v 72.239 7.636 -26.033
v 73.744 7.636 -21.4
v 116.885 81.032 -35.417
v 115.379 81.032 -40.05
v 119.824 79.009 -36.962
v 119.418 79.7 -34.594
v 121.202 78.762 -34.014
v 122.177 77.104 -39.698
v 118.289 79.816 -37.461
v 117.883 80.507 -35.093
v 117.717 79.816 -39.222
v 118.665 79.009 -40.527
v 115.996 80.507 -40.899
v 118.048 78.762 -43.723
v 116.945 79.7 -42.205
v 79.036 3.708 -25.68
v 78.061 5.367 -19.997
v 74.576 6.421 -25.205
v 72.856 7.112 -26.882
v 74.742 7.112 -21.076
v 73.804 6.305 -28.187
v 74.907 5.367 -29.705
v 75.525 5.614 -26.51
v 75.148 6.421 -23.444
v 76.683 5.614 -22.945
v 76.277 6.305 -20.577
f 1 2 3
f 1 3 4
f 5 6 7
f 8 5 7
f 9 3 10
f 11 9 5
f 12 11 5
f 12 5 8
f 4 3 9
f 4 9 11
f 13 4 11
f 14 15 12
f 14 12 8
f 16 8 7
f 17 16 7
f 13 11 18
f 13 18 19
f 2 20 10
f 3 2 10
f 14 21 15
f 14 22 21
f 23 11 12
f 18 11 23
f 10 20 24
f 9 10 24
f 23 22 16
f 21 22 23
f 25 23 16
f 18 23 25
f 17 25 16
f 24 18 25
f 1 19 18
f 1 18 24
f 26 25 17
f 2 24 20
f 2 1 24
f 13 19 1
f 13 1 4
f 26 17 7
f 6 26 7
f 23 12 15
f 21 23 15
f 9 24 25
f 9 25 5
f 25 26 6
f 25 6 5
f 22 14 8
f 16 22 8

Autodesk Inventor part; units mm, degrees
sketch "Boceto1" plane through (0, 0, 0) normal (0, 1, 0) x (-1, 0, 0)
  line L0 (47.5, 65.3781) -> (76.8566, -24.9722)
  line L1 (76.8566, -24.9722) -> (0, -80.8118)
  line L2 (0, -80.8118) -> (-76.8566, -24.9722)
  line L3 (-76.8566, -24.9722) -> (-47.5, 65.3781)
  line L4 (-47.5, 65.3781) -> (47.5, 65.3781)
  line L5 (0, 0) -> (130.7563, 0) construction
  line L6 (130.7563, 0) -> (130.7563, 130.7563) construction
  line L7 (130.7563, 130.7563) -> (0, 130.7563) construction
  line L8 (0, 130.7563) -> (0, 0) construction
  line L9 (130.7563, 130.7563) -> (0, 65.3781)
  dimension "d0" = 95
  dimension "d1" = 211.5681
  dimension "d2" = 26.565
extrude "Extrusión1" add sketch "Boceto1" along normal blind 211.5681 draft 26.565
sketch "Boceto2" plane through (0, 211.5681, 0) normal (0, 1, 0) x (1, 0, 0)
  line L0 (0, -80.8118) -> (-76.8566, -24.9722)
  line L1 (-76.8566, -24.9722) -> (-47.5, 65.3781)
  line L2 (-47.5, 65.3781) -> (47.5, 65.3781)
  line L3 (47.5, 65.3781) -> (76.8566, -24.9722)
  line L4 (76.8566, -24.9722) -> (0, -80.8118)
  point P0 (0, 0)
  point P1 (0, 0)
  dimension "L" = 95
extrude "Extrusión2" cut sketch "Boceto2" against normal blind 211.5681 draft 26.565 keep common part
sketch "Boceto3" plane through (47.5, 0, 65.3781) normal (0.8506508, -0.4472136, 0.2763932) x (0.309017, 0, -0.9510565)
  line L0 (47.5, 146.19) -> (124.3566, 90.3504) projected
  line L1 (-29.3566, 90.3504) -> (47.5, 146.19) projected
  line L2 (0, 0) -> (-29.3566, 90.3504) projected
  line L3 (0, 0) -> (95, 0) projected
  line L4 (95, 0) -> (124.3566, 90.3504) projected
  line L5 (117.3032, 88.0586) -> (47.5, 138.7736)
  line L6 (47.5, 138.7736) -> (-22.3032, 88.0586)
  line L7 (-22.3032, 88.0586) -> (4.3593, 6)
  line L8 (4.3593, 6) -> (90.6407, 6)
  line L9 (90.6407, 6) -> (117.3032, 88.0586)
  point P0 (47.5, -29.238)
  dimension "D" = 6
extrude "Extrusión3" cut sketch "Boceto3" against normal blind 111.5681 contours L9 L8 L7 L6 L5
sketch "Boceto4" plane through (76.8566, 0, -24.9722) normal (0.5257311, -0.4472136, -0.7236068) x (-0.809017, 0, -0.5877853)
  line L0 (47.5, 146.19) -> (124.3566, 90.3504) projected
  line L1 (-29.3566, 90.3504) -> (47.5, 146.19) projected
  line L2 (0, 0) -> (-29.3566, 90.3504) projected
  line L3 (0, 0) -> (95, 0) projected
  line L4 (95, 0) -> (124.3566, 90.3504) projected
  line L5 (90.6407, 6) -> (4.3593, 6)
  line L6 (4.3593, 6) -> (-22.3032, 88.0586)
  line L7 (-22.3032, 88.0586) -> (47.5, 138.7736)
  line L8 (47.5, 138.7736) -> (117.3032, 88.0586)
  line L9 (117.3032, 88.0586) -> (90.6407, 6)
  point P0 (47.5, -29.238)
  dimension "d14" = 6
extrude "Extrusión4" cut sketch "Boceto4" against normal blind 111.5681 contours L5 L6 L7 L8 L9
sketch "Boceto5" plane through (0, 0, 0) normal (0, -1, 0) x (1, 0, 0)
  line L0 (76.8566, -24.9722) -> (0, -80.8118) projected
  line L1 (47.5, 65.3781) -> (76.8566, -24.9722) projected
  line L2 (-47.5, 65.3781) -> (47.5, 65.3781) projected
  line L3 (-76.8566, -24.9722) -> (-47.5, 65.3781) projected
  line L4 (0, -80.8118) -> (-76.8566, -24.9722) projected
  line L5 (43.1407, 59.3781) -> (69.8032, -22.6804)
  line L6 (69.8032, -22.6804) -> (0, -73.3954)
  line L7 (0, -73.3954) -> (-69.8032, -22.6804)
  line L8 (-69.8032, -22.6804) -> (-43.1407, 59.3781)
  line L9 (-43.1407, 59.3781) -> (43.1407, 59.3781)
  point P0 (0, 0)
  dimension "d17" = 6
extrude "Extrusión5" cut sketch "Boceto5" against normal blind 111.5681 contours L5 L6 L7 L8 L9
sketch "Boceto6" plane through (47.5, 211.5681, -65.3781) normal (0, 0.4472136, -0.8944272) x (-1, 0, 0)
  line L0 (47.5, -146.19) -> (124.3566, -90.3504) projected
  line L1 (95, 0) -> (124.3566, -90.3504) projected
  line L2 (95, 0) -> (0, 0) projected
  line L3 (0, 0) -> (-29.3566, -90.3504) projected
  line L4 (-29.3566, -90.3504) -> (47.5, -146.19) projected
  line L5 (117.3032, -88.0586) -> (47.5, -138.7736)
  line L6 (47.5, -138.7736) -> (-22.3032, -88.0586)
  line L7 (-22.3032, -88.0586) -> (4.3593, -6)
  line L8 (4.3593, -6) -> (90.6407, -6)
  line L9 (90.6407, -6) -> (117.3032, -88.0586)
  point P0 (47.5, -159.9943)
  dimension "d20" = 6
extrude "Extrusión6" cut sketch "Boceto6" against normal blind 111.5681 contours L5 L6 L7 L8 L9
sketch "Boceto7" plane through (0, 0, -80.8118) normal (-0.5257311, -0.4472136, -0.7236068) x (-0.809017, 0, 0.5877853)
  line L0 (47.5, 146.19) -> (124.3566, 90.3504) projected
  line L1 (-29.3566, 90.3504) -> (47.5, 146.19) projected
  line L2 (0, 0) -> (-29.3566, 90.3504) projected
  line L3 (0, 0) -> (95, 0) projected
  line L4 (95, 0) -> (124.3566, 90.3504) projected
  line L5 (117.3032, 88.0586) -> (47.5, 138.7736)
  line L6 (47.5, 138.7736) -> (-22.3032, 88.0586)
  line L7 (-22.3032, 88.0586) -> (4.3593, 6)
  line L8 (4.3593, 6) -> (90.6407, 6)
  line L9 (90.6407, 6) -> (117.3032, 88.0586)
  point P0 (47.5, -29.238)
  dimension "d23" = 6
extrude "Extrusión7" cut sketch "Boceto7" against normal blind 111.5681 contours L9 L8 L7 L6 L5
sketch "Boceto8" plane through (76.8566, 211.5681, 24.9722) normal (0.8506508, 0.4472136, -0.2763932) x (-0.309017, 0, -0.9510565)
  line L0 (47.5, -146.19) -> (124.3566, -90.3504) projected
  line L1 (95, 0) -> (124.3566, -90.3504) projected
  line L2 (95, 0) -> (0, 0) projected
  line L3 (0, 0) -> (-29.3566, -90.3504) projected
  line L4 (-29.3566, -90.3504) -> (47.5, -146.19) projected
  line L5 (47.5, -138.7736) -> (117.3032, -88.0586)
  line L6 (117.3032, -88.0586) -> (90.6407, -6)
  line L7 (90.6407, -6) -> (4.3593, -6)
  line L8 (4.3593, -6) -> (-22.3032, -88.0586)
  line L9 (-22.3032, -88.0586) -> (47.5, -138.7736)
  point P0 (47.5, -159.9943)
  dimension "d26" = 6
extrude "Extrusión8" cut sketch "Boceto8" against normal blind 111.5681 contours L9 L8 L7 L6 L5
sketch "Boceto9" plane through (0, 211.5681, 0) normal (0, 1, 0) x (1, 0, 0)
  line L0 (78.0615, -19.9972) -> (-16.844, -50.8338) projected
  line L1 (-47.5, 65.3781) -> (47.5, 65.3781) projected
  line L2 (-76.8566, -24.9722) -> (-47.5, 65.3781) projected
  line L3 (0, -80.8118) -> (-76.8566, -24.9722) projected
  line L4 (76.8566, -24.9722) -> (0, -80.8118) projected
  line L5 (47.5, 65.3781) -> (76.8566, -24.9722) projected
  line L6 (0, -73.3954) -> (-69.8032, -22.6804)
  line L7 (-69.8032, -22.6804) -> (-43.1407, 59.3781)
  line L8 (-43.1407, 59.3781) -> (43.1407, 59.3781)
  line L9 (43.1407, 59.3781) -> (69.8032, -22.6804)
  line L10 (69.8032, -22.6804) -> (0, -73.3954)
  point P0 (0, 0)
  dimension "d29" = 6
extrude "Extrusión9" cut sketch "Boceto9" against normal blind 111.5681 contours L6 L7 L8 L9 L10
sketch "Boceto10" plane through (-47.5, 211.5681, -65.3781) normal (-0.8506508, 0.4472136, -0.2763932) x (-0.309017, 0, 0.9510565)
  line L0 (-29.3566, -90.3504) -> (47.5, -146.19) projected
  line L1 (47.5, -146.19) -> (124.3566, -90.3504) projected
  line L2 (95, 0) -> (124.3566, -90.3504) projected
  line L3 (95, 0) -> (0, 0) projected
  line L4 (0, 0) -> (-29.3566, -90.3504) projected
  line L5 (117.3032, -88.0586) -> (47.5, -138.7736)
  line L6 (47.5, -138.7736) -> (-22.3032, -88.0586)
  line L7 (-22.3032, -88.0586) -> (4.3593, -6)
  line L8 (4.3593, -6) -> (90.6407, -6)
  line L9 (90.6407, -6) -> (117.3032, -88.0586)
  point P0 (47.5, -159.9943)
  dimension "d32" = 6
extrude "Extrusión10" cut sketch "Boceto10" against normal blind 111.5681 contours L5 L6 L7 L8 L9
sketch "Boceto11" plane through (-76.8566, 0, -24.9722) normal (-0.8506508, -0.4472136, 0.2763932) x (0.309017, 0, 0.9510565)
  line L0 (47.5, 65.3781) -> (90.6407, 79.3954) projected
  line L1 (-29.3566, 90.3504) -> (47.5, 146.19) projected
  line L2 (0, 0) -> (-29.3566, 90.3504) projected
  line L3 (0, 0) -> (95, 0) projected
  line L4 (95, 0) -> (124.3566, 90.3504) projected
  line L5 (47.5, 146.19) -> (124.3566, 90.3504) projected
  line L6 (117.3032, 88.0586) -> (90.6407, 6)
  line L7 (90.6407, 6) -> (4.3593, 6)
  line L8 (4.3593, 6) -> (-22.3032, 88.0586)
  line L9 (-22.3032, 88.0586) -> (47.5, 138.7736)
  line L10 (47.5, 138.7736) -> (117.3032, 88.0586)
  point P0 (47.5, -29.238)
  dimension "d35" = 6
extrude "Extrusión11" cut sketch "Boceto11" against normal blind 111.5681 contours L6 L7 L8 L9 L10
sketch "Boceto12" plane through (-47.5, 0, 65.3781) normal (0, -0.4472136, 0.8944272) x (1, 0, 0)
  line L0 (4.3593, 6) -> (47.5, 65.3781) projected
  line L1 (-29.3566, 90.3504) -> (47.5, 146.19) projected
  line L2 (0, 0) -> (-29.3566, 90.3504) projected
  line L3 (0, 0) -> (95, 0) projected
  line L4 (95, 0) -> (124.3566, 90.3504) projected
  line L5 (47.5, 146.19) -> (124.3566, 90.3504) projected
  line L6 (117.3032, 88.0586) -> (90.6407, 6)
  line L7 (90.6407, 6) -> (4.3593, 6)
  line L8 (4.3593, 6) -> (-22.3032, 88.0586)
  line L9 (-22.3032, 88.0586) -> (47.5, 138.7736)
  line L10 (47.5, 138.7736) -> (117.3032, 88.0586)
  point P0 (47.5, -29.238)
  dimension "d38" = 6
extrude "Extrusión12" cut sketch "Boceto12" against normal blind 111.5681 contours L6 L7 L8 L9 L10
sketch "Boceto13" plane through (0, 211.5681, 80.8118) normal (0.5257311, 0.4472136, 0.7236068) x (0.809017, 0, -0.5877853)
  line L0 (-29.3566, -90.3504) -> (47.5, -146.19) projected
  line L1 (47.5, -146.19) -> (124.3566, -90.3504) projected
  line L2 (95, 0) -> (124.3566, -90.3504) projected
  line L3 (95, 0) -> (0, 0) projected
  line L4 (0, 0) -> (-29.3566, -90.3504) projected
  line L5 (47.5, -138.7736) -> (-22.3032, -88.0586)
  line L6 (-22.3032, -88.0586) -> (4.3593, -6)
  line L7 (4.3593, -6) -> (90.6407, -6)
  line L8 (90.6407, -6) -> (117.3032, -88.0586)
  line L9 (117.3032, -88.0586) -> (47.5, -138.7736)
  point P0 (47.5, -159.9943)
  dimension "d41" = 6
extrude "Extrusión13" cut sketch "Boceto13" against normal blind 111.5681 contours L5 L6 L7 L8 L9
sketch "Boceto14" plane through (-76.8566, 211.5681, 24.9722) normal (-0.5257311, 0.4472136, 0.7236068) x (0.809017, 0, 0.5877853)
  line L0 (-29.3566, -90.3504) -> (47.5, -146.19) projected
  line L1 (47.5, -146.19) -> (124.3566, -90.3504) projected
  line L2 (95, 0) -> (124.3566, -90.3504) projected
  line L3 (95, 0) -> (0, 0) projected
  line L4 (0, 0) -> (-29.3566, -90.3504) projected
  line L5 (-22.3032, -88.0586) -> (47.5, -138.7736)
  line L6 (47.5, -138.7736) -> (117.3032, -88.0586)
  line L7 (117.3032, -88.0586) -> (90.6407, -6)
  line L8 (90.6407, -6) -> (4.3593, -6)
  line L9 (4.3593, -6) -> (-22.3032, -88.0586)
  point P0 (47.5, -159.9943)
  dimension "d44" = 6
extrude "Extrusión14" cut sketch "Boceto14" against normal blind 111.5681 contours L9 L8 L7 L6 L5
ref_plane "Plano de trabajo1" through (47.5, 210.2265, -62.6949) normal (0, 0.4472136, -0.8944272) x (-1, 0, 0)
sketch "Boceto15" plane through (47.5, 210.2265, -62.6949) normal (0, 0.4472136, -0.8944272) x (-1, 0, 0)
  line L0 (4.3593, -6) -> (90.6407, -6) projected
  line L1 (-22.3032, -88.0586) -> (4.3593, -6) projected
  line L2 (47.5, -138.7736) -> (-22.3032, -88.0586) projected
  line L3 (117.3032, -88.0586) -> (47.5, -138.7736) projected
  line L4 (90.6407, -6) -> (117.3032, -88.0586) projected
  line L5 (2.5429, -3.5) -> (92.4571, -3.5)
  line L6 (92.4571, -3.5) -> (120.2421, -89.0135)
  line L7 (120.2421, -89.0135) -> (47.5, -141.8637)
  line L8 (47.5, -141.8637) -> (-25.2421, -89.0135)
  line L9 (-25.2421, -89.0135) -> (2.5429, -3.5)
  point P0 (47.5, -159.9943)
  dimension "D2" = 2.5
extrude "Extrusión15" cut sketch "Boceto15" along normal mid plane 1.8 contours L0 L4 L3 L2 L1 | L5 L6 L7 L8 L9
ref_plane "Plano de trabajo2" through (75.2794, 1.3416, -22.8014) normal (0.5257311, -0.4472136, -0.7236068) x (-0.809017, 0, -0.5877853)
sketch "Boceto16" plane through (75.2794, 1.3416, -22.8014) normal (0.5257311, -0.4472136, -0.7236068) x (-0.809017, 0, -0.5877853)
  line L0 (90.6407, 6) -> (4.3593, 6) projected
  line L1 (117.3032, 88.0586) -> (90.6407, 6) projected
  line L2 (47.5, 138.7736) -> (117.3032, 88.0586) projected
  line L3 (-22.3032, 88.0586) -> (47.5, 138.7736) projected
  line L4 (4.3593, 6) -> (-22.3032, 88.0586) projected
  line L5 (2.5429, 3.5) -> (92.4571, 3.5)
  line L6 (92.4571, 3.5) -> (120.2421, 89.0135)
  line L7 (120.2421, 89.0135) -> (47.5, 141.8637)
  line L8 (47.5, 141.8637) -> (-25.2421, 89.0135)
  line L9 (-25.2421, 89.0135) -> (2.5429, 3.5)
  point P0 (47.5, -29.238)
  dimension "d52" = 2.5
extrude "Extrusión16" cut sketch "Boceto16" along normal mid plane 1.8
ref_plane "Plano de trabajo3" through (74.3047, 210.2265, 25.8014) normal (0.8506508, 0.4472136, -0.2763932) x (-0.309017, 0, -0.9510565)
sketch "Boceto17" plane through (74.3047, 210.2265, 25.8014) normal (0.8506508, 0.4472136, -0.2763932) x (-0.309017, 0, -0.9510565)
  line L0 (47.5, -138.7736) -> (-22.3032, -88.0586) projected
  line L1 (117.3032, -88.0586) -> (47.5, -138.7736) projected
  line L2 (90.6407, -6) -> (117.3032, -88.0586) projected
  line L3 (4.3593, -6) -> (90.6407, -6) projected
  line L4 (-22.3032, -88.0586) -> (4.3593, -6) projected
  line L5 (-25.2421, -89.0135) -> (47.5, -141.8637)
  line L6 (47.5, -141.8637) -> (120.2421, -89.0135)
  line L7 (120.2421, -89.0135) -> (92.4571, -3.5)
  line L8 (92.4571, -3.5) -> (2.5429, -3.5)
  line L9 (2.5429, -3.5) -> (-25.2421, -89.0135)
  point P0 (47.5, -159.9943)
  dimension "d56" = 2.5
extrude "Extrusión17" cut sketch "Boceto17" along normal mid plane 1.8
ref_plane "Plano de trabajo4" through (1.5772, 1.3416, -78.641) normal (-0.5257311, -0.4472136, -0.7236068) x (-0.809017, 0, 0.5877853)
sketch "Boceto18" plane through (1.5772, 1.3416, -78.641) normal (-0.5257311, -0.4472136, -0.7236068) x (-0.809017, 0, 0.5877853)
  line L0 (117.3032, 88.0586) -> (90.6407, 6) projected
  line L1 (47.5, 138.7736) -> (117.3032, 88.0586) projected
  line L2 (-22.3032, 88.0586) -> (47.5, 138.7736) projected
  line L3 (4.3593, 6) -> (-22.3032, 88.0586) projected
  line L4 (90.6407, 6) -> (4.3593, 6) projected
  line L5 (92.4571, 3.5) -> (120.2421, 89.0135)
  line L6 (120.2421, 89.0135) -> (47.5, 141.8637)
  line L7 (47.5, 141.8637) -> (-25.2421, 89.0135)
  line L8 (-25.2421, 89.0135) -> (2.5429, 3.5)
  line L9 (2.5429, 3.5) -> (92.4571, 3.5)
  point P0 (47.5, -29.238)
  dimension "d60" = 2.5
extrude "Extrusión18" cut sketch "Boceto18" along normal mid plane 1.8 contours L0 L4 L3 L2 L1 | L9 L8 L7 L6 L5
ref_plane "Plano de trabajo5" through (0, 3, 0) normal (0, -1, 0) x (1, 0, 0)
sketch "Boceto19" plane through (0, 3, 0) normal (0, -1, 0) x (1, 0, 0)
  line L0 (0, -73.3954) -> (-69.8032, -22.6804) projected
  line L1 (-69.8032, -22.6804) -> (-43.1407, 59.3781) projected
  line L2 (-43.1407, 59.3781) -> (43.1407, 59.3781) projected
  line L3 (43.1407, 59.3781) -> (69.8032, -22.6804) projected
  line L4 (69.8032, -22.6804) -> (0, -73.3954) projected
  line L5 (76.8566, -24.9722) -> (0, -80.8118) projected
  line L6 (47.5, 65.3781) -> (76.8566, -24.9722) projected
  line L7 (-47.5, 65.3781) -> (47.5, 65.3781) projected
  line L8 (-76.8566, -24.9722) -> (-47.5, 65.3781) projected
  line L9 (0, -80.8118) -> (-76.8566, -24.9722) projected
  line L10 (-44.9571, 61.8781) -> (-72.7421, -23.6353)
  line L11 (-72.7421, -23.6353) -> (0, -76.4856)
  line L12 (0, -76.4856) -> (72.7421, -23.6353)
  line L13 (72.7421, -23.6353) -> (44.9571, 61.8781)
  line L14 (44.9571, 61.8781) -> (-44.9571, 61.8781)
  point P0 (0, 0)
  dimension "d64" = 2.5
extrude "Extrusión19" cut sketch "Boceto19" along normal mid plane 1.8 contours L0 L1 L2 L3 L4 | L14 L13 L12 L11 L10
ref_plane "Plano de trabajo6" through (44.948, 1.3416, 64.549) normal (0.8506508, -0.4472136, 0.2763932) x (0.309017, 0, -0.9510565)
sketch "Boceto20" plane through (44.948, 1.3416, 64.549) normal (0.8506508, -0.4472136, 0.2763932) x (0.309017, 0, -0.9510565)
  line L0 (4.3593, 6) -> (-22.3032, 88.0586) projected
  line L1 (-22.3032, 88.0586) -> (47.5, 138.7736) projected
  line L2 (47.5, 138.7736) -> (117.3032, 88.0586) projected
  line L3 (117.3032, 88.0586) -> (90.6407, 6) projected
  line L4 (90.6407, 6) -> (4.3593, 6) projected
  line L5 (47.5, 146.19) -> (124.3566, 90.3504) projected
  line L6 (-29.3566, 90.3504) -> (47.5, 146.19) projected
  line L7 (0, 0) -> (-29.3566, 90.3504) projected
  line L8 (0, 0) -> (95, 0) projected
  line L9 (95, 0) -> (124.3566, 90.3504) projected
  line L10 (-25.2421, 89.0135) -> (2.5429, 3.5)
  line L11 (2.5429, 3.5) -> (92.4571, 3.5)
  line L12 (92.4571, 3.5) -> (120.2421, 89.0135)
  line L13 (120.2421, 89.0135) -> (47.5, 141.8637)
  line L14 (47.5, 141.8637) -> (-25.2421, 89.0135)
  point P0 (47.5, -29.238)
  dimension "d68" = 2.5
extrude "Extrusión20" cut sketch "Boceto20" along normal mid plane 1.8 contours L0 L1 L2 L3 L4 | L14 L13 L12 L11 L10
ref_plane "Plano de trabajo7" through (121.2022, 87.4453, -39.381) normal (-0.309017, 0, -0.9510565) x (-0.8506508, -0.4472136, 0.2763932)
split body "Dividir1" result two bodies by plane through (121.2022, 87.4453, -39.381) normal (-0.309017, 0, -0.9510565) first body at (-25.6189, 99.4475, -120.8794)
ref_plane "Plano de trabajo8" through (118.0478, 78.762, -43.7226) normal (0, -0.8506508, 0.5257311) x (-0.5257311, 0.4472136, 0.7236068)
split "Dividir2" plane through (118.0478, 78.762, -43.7226) removes the side toward (0, 0.8506508, -0.5257311)
ref_plane "Plano de trabajo9" through (121.2022, 78.762, -34.0144) normal (-0.309017, -0.8506508, -0.4253254) x (-0.8506508, 0.4472136, -0.2763932)
split "Dividir3" plane through (121.2022, 78.762, -34.0144) removes the side toward (0.309017, 0.8506508, 0.4253254)
ref_plane "Plano de trabajo13" through (34.9016, 9.7082, -48.0379) normal (-0.5, -0.5257311, 0.688191) x (0.809017, 0, 0.5877853)
split "Dividir7" plane through (34.9016, 9.7082, -48.0379) removes the side toward (-0.5, -0.5257311, 0.688191)
ref_plane "Plano de trabajo14" through (74.9071, 5.3666, -29.7054) normal (-0.809017, -0.5257311, -0.2628656) x (-0.5257311, 0.4472136, 0.7236068)
split "Dividir8" plane through (74.9071, 5.3666, -29.7054) removes the side toward (-0.809017, -0.5257311, -0.2628656)
ref_plane "Plano de trabajo16" through (107.0671, 64.0042, -31.5775) normal (-0.809017, 0.5257311, 0.2628656) x (0.5, 0.8506508, -0.1624598)
ref_plane "Plano de trabajo15" through (107.8761, 63.4785, -31.8404) normal (-0.809017, 0.5257311, 0.2628656) x (0.5, 0.8506508, -0.1624598)
combine bodies "Combinar1" operation type add bodies to combine 2 3
split "Dividir9" plane through (107.0671, 64.0042, -31.5775) removes the side toward (-0.809017, 0.5257311, 0.2628656)
ref_plane "Plano de trabajo17" through (78.0615, 5.3666, -19.9972) normal (-0.1624598, 0.2763932, 0.9472136) x (0.8506508, -0.4472136, 0.2763932)
split "Dividir10" plane through (78.0615, 5.3666, -19.9972) removes the side toward (-0.1624598, 0.2763932, 0.9472136)
sketch "Boceto23" plane through (76.8566, 0, -24.9722) normal (-0.809017, -0.5257311, -0.2628656) x (-0.5257311, 0.4472136, 0.7236068)
  line L0 (6.356, 4.8556) -> (5.0756, 7.4164) projected
  line L1 (3.9, 7.4164) -> (5.0756, 7.4164) projected
  line L2 (3.9, 4.3262) -> (3.9, 7.4164) projected
  line L3 (3.9, 4.3262) -> (2.1, 4.3262) projected
  line L4 (2.1, 7.4164) -> (2.1, 4.3262) projected
  line L5 (0, 7.4164) -> (2.1, 7.4164) projected
  line L6 (0, 0) -> (0, 7.4164) projected
  line L7 (0, 0) -> (6.356, 4.8556) projected
  line L8 (0, 7.4164) -> (0.78, 7.4164)
  line L9 (0, 7.4164) -> (2.1, 7.4164) projected
  line L10 (0.78, 7.4164) -> (1.28, 7.4164)
  line L11 (1.28, 7.4164) -> (0.78, 7.4164)
  line L12 (0.78, 7.4164) -> (0.78, 2.4164)
  line L13 (0.78, 2.4164) -> (1.28, 2.4164)
  line L14 (1.28, 2.4164) -> (1.28, 7.4164)
  point P0 (58.476, 4.2658)
  point P1 (1.28, 7.4164)
  point P2 (0.78, 7.4164)
  dimension "d91" = 0.78
  dimension "d92" = 0.5
  dimension "d93" = 5
extrude "Extrusión23" add sketch "Boceto23" along normal blind 0.7 contours L5 L14 L13 L12 bodies 3
chamfer "Chaflán3" distance 0.7 angle 45 2 edges at (75.1542, 3.9064, -27.5454) (74.8913, 4.13, -27.1836)
ref_plane "Plano de trabajo18" through (73.8031, 6.3057, -28.1858) normal (-0.688191, 0.2763932, -0.6708204) x (-0.5257311, 0.4472136, 0.7236068)
split "Dividir11" plane through (73.8031, 6.3057, -28.1858) removes the side toward (-0.688191, 0.2763932, -0.6708204)
ref_plane "Plano de trabajo19" through (121.2022, 78.762, -34.0144) normal (0.5, 0.8506508, -0.1624598) x (-0.8506508, 0.4472136, -0.2763932)
ref_plane "Plano de trabajo20" through (78.0615, 5.3666, -19.9972) normal (0.5, 0.8506508, -0.1624598) x (-0.8506508, 0.4472136, -0.2763932)
split "Dividir12" plane through (78.0615, 5.3666, -19.9972) removes the side toward (-0.5, -0.8506508, 0.1624598)
split "Dividir13" plane through (121.2022, 78.762, -34.0144) removes the side toward (0.5, 0.8506508, -0.1624598)
equation "\"d0\" = L"
equation "\"d3\" = d1"
equation "\"d4\" = d2"
equation "\"d6\" = d1"
equation "\"d7\" = d2"
equation "\"d14\" = D"
equation "\"d17\" = D"
equation "\"d20\" = D"
equation "\"d23\" = D"
equation "\"d26\" = D"
equation "\"d29\" = D"
equation "\"d32\" = D"
equation "\"d35\" = D"
equation "\"d38\" = D"
equation "\"d41\" = D"
equation "\"d44\" = D"
equation "\"d48\" = ESP"
equation "\"d52\" = D2"
equation "\"d56\" = D2"
equation "\"d57\" = ESP"
equation "\"d60\" = D2"
equation "\"d61\" = ESP"
equation "\"d64\" = D2"
equation "\"d65\" = ESP"
equation "\"d68\" = D2"
equation "\"d69\" = ESP"
equation "\"d51\" = P"
equation "\"d55\" = P"
equation "\"d59\" = P"
equation "\"d63\" = P"
equation "\"d67\" = P"
equation "\"ESP\" = 1.8"
equation "\"P\" = -3"
properties part number "Perfil"
